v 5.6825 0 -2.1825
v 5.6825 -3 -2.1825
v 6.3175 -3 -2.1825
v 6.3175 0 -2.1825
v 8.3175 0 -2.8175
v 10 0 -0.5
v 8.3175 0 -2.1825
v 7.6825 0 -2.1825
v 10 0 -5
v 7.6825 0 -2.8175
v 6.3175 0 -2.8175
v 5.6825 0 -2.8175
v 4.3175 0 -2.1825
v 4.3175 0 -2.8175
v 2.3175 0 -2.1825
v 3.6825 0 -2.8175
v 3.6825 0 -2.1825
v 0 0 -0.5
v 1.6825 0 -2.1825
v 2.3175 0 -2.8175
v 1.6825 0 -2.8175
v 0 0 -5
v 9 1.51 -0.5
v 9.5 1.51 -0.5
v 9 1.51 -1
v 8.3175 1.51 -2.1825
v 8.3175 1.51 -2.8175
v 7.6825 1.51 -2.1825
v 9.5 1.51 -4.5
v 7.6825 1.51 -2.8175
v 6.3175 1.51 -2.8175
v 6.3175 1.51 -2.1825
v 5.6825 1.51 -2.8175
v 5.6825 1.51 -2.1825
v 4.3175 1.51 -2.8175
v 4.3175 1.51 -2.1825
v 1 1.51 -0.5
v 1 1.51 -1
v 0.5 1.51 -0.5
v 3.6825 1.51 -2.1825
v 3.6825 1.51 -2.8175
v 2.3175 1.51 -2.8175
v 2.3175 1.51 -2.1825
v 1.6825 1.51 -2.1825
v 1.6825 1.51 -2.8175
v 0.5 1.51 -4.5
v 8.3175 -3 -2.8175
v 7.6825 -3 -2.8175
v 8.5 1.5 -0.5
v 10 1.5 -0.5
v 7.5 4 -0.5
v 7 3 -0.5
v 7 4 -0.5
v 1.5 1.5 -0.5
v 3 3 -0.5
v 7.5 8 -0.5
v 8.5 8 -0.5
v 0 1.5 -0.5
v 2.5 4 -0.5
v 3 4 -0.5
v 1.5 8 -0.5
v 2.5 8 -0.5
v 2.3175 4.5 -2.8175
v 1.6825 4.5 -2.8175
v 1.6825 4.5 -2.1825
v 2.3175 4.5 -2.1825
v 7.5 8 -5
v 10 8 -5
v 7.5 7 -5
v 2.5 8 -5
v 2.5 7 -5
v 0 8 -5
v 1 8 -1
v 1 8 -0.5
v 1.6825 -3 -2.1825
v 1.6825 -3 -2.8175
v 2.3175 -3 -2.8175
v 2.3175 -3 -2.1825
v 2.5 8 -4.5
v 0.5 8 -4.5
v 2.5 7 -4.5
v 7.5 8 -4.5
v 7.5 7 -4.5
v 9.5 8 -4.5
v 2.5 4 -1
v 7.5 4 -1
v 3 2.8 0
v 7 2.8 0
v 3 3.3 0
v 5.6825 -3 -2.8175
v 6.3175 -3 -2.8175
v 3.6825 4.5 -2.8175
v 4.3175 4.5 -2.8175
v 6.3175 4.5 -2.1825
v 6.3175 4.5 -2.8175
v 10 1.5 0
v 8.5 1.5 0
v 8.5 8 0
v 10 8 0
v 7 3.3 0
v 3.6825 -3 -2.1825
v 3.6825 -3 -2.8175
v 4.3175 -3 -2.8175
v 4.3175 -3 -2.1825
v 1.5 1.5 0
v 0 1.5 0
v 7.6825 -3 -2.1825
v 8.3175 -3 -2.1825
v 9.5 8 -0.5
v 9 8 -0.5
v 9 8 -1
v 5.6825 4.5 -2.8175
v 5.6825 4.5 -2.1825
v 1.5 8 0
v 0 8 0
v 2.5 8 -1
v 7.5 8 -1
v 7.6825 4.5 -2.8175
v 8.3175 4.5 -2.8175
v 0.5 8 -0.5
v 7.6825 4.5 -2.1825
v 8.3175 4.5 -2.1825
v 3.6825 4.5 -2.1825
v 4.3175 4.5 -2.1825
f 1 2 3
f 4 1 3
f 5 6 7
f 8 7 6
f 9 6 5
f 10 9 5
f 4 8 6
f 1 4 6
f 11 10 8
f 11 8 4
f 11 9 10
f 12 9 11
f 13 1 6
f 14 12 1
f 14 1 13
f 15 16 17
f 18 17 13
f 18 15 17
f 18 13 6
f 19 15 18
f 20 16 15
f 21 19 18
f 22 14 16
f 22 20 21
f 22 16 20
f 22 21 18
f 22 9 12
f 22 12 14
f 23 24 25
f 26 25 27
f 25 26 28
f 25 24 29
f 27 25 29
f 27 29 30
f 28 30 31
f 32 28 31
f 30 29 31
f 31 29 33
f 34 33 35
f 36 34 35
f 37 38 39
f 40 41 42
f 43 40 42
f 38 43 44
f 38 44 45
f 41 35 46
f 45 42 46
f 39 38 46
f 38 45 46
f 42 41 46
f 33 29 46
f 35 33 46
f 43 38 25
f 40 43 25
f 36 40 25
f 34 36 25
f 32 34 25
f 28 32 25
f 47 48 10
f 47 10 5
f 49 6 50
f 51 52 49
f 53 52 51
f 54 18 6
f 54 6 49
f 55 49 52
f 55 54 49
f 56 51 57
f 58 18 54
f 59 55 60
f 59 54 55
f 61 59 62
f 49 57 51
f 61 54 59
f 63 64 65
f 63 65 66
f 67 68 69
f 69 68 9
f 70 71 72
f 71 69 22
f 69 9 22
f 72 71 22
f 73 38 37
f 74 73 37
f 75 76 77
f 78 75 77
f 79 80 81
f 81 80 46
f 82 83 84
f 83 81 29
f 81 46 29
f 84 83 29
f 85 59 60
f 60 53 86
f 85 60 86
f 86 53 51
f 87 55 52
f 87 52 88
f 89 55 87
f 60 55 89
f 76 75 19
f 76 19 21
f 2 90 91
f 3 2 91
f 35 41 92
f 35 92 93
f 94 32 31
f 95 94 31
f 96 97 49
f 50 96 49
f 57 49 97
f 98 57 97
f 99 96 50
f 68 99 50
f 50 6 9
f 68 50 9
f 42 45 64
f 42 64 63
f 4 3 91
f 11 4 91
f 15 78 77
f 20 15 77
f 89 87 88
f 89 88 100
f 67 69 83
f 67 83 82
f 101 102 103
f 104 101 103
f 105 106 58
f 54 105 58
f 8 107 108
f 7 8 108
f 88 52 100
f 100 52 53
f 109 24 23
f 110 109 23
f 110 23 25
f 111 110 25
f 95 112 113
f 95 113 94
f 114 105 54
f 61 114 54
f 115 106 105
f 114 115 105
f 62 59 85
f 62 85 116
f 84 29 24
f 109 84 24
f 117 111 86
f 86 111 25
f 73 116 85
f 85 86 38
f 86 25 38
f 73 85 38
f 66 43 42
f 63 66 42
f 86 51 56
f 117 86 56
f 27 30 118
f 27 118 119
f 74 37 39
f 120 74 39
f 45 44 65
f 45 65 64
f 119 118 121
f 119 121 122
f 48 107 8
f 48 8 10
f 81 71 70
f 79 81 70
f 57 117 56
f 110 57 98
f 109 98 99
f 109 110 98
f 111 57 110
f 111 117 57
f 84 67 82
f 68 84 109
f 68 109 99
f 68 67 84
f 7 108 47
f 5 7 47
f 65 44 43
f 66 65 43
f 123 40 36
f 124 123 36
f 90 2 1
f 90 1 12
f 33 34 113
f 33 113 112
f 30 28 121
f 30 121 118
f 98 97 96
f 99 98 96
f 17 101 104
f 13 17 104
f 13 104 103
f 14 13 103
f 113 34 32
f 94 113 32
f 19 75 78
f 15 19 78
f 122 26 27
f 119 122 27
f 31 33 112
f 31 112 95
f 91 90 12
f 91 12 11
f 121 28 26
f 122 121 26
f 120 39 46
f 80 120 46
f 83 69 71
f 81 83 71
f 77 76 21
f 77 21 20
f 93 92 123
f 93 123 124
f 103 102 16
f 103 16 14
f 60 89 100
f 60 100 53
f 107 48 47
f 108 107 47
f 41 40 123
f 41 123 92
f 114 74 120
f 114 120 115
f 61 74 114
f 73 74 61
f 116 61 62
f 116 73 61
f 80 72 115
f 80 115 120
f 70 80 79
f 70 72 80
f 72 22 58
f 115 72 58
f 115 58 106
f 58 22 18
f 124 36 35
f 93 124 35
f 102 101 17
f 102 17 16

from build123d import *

# Parameters (mm, degrees)
SIDES_DEPTH           = 8
SKETCH2_W             = 5
SKETCH2_H             = 4
FRONT_CUT_DEPTH       = 0.5
BACK_CUT_REACH        = 15.748
SKETCH3_W             = 5
SKETCH3_H             = 1
BASE_DEPTH            = 0.5
PINS_DEPTH            = 4
PINS_DEPTH_BACK       = 3.5
SKETCH4_W             = 0.635
SKETCH4_H             = 0.635
CLIP_DEPTH            = 2
CLIP_DEPTH_BACK       = 2
FRONT_TRIM_DEPTH      = 11.677078252
FRONT_TRIM_DEPTH_BACK = 11.677078252
SKETCH6_W             = 0.5
SKETCH6_H             = 1.5
BOSS_EXTRUDE4_DEPTH   = 1.51


with BuildPart() as part:
    # Sketch1 → Sides (new body)
    with BuildSketch(Plane(origin=(0, 0, 0), x_dir=(1, 0, 0), z_dir=(0, 1, 0))):
        Polygon((8.5, 0), (10, 0), (10, 5), (0, 5), (0, 0), (1.5, 0), (1.5, 0.5), (8.5, 0.5), align=None)
        Polygon((0.5, 4.5), (9.5, 4.5), (9.5, 1.528846154), (9.5, 0.5), (9, 0.5), (9, 1), (1, 1), (1, 0.5), (0.5, 0.5), (0.5, 1.538461538), align=None, mode=Mode.SUBTRACT)
    extrude(amount=SIDES_DEPTH)

    # Sketch2 → Front cut (cut)
    with BuildSketch(Plane.XY.offset(-0.5)):
        with Locations((5, 6)):
            Rectangle(SKETCH2_W, SKETCH2_H)
    extrude(amount=-FRONT_CUT_DEPTH, mode=Mode.SUBTRACT)

    # Sketch3 → Back cut (cut, up to next)
    with BuildSketch(Plane(origin=(0, 0, -5), x_dir=(-1, 0, 0), z_dir=(0, 0, -1)), mode=Mode.PRIVATE) as back_cut_sk1:
        with Locations((-5, 7.5)):
            Rectangle(SKETCH3_W, SKETCH3_H)
    back_cut_tool1 = extrude(back_cut_sk1.sketch, amount=-BACK_CUT_REACH, mode=Mode.PRIVATE) & part.part
    add(back_cut_tool1.solids().sort_by_distance((5, 7.5, -5))[0], mode=Mode.SUBTRACT)

    # Sketch1<2> → Base (add)
    with BuildSketch(Plane(origin=(0, 0, 0), x_dir=(1, 0, 0), z_dir=(0, 1, 0))):
        Polygon((1, 1), (1, 0.5), (0.5, 0.5), (0.5, 1.538461538), (0.5, 4.5), (9.5, 4.5), (9.5, 1.528846154), (9.5, 0.5), (9, 0.5), (9, 1), align=None)
    extrude(amount=BASE_DEPTH)

    # Sketch4 → Pins (add, two sides: drawn at the far end of the back side and taken through both)
    with BuildSketch(Plane(origin=(0, 0.5, 0), x_dir=(1, 0, 0), z_dir=(0, 1, 0)).offset(-PINS_DEPTH_BACK)):
        with Locations((2, 2.5)):
            Rectangle(SKETCH4_W, SKETCH4_H)
        with Locations((4, 2.5)):
            Rectangle(SKETCH4_W, SKETCH4_H)
        with Locations((6, 2.5)):
            Rectangle(SKETCH4_W, SKETCH4_H)
        with Locations((8, 2.5)):
            Rectangle(SKETCH4_W, SKETCH4_H)
    extrude(amount=PINS_DEPTH + PINS_DEPTH_BACK)

    # Sketch5 → Clip (add, two sides: drawn at the far end of the back side and taken through both)
    with BuildSketch(Plane(origin=(5, 0, 0), x_dir=(0, 0, -1), z_dir=(1, 0, 0)).offset(-CLIP_DEPTH_BACK)):
        Polygon((0.5, 4), (0.5, 3), (0, 2.8), (0, 3.3), align=None)
    extrude(amount=CLIP_DEPTH + CLIP_DEPTH_BACK)

    # Sketch6 → Front trim (cut, two sides: drawn at the far end of the back side and taken through both)
    with BuildSketch(Plane(origin=(5, 0, 0), x_dir=(0, 0, -1), z_dir=(1, 0, 0)).offset(-FRONT_TRIM_DEPTH_BACK)):
        with Locations((0.25, 0.75)):
            Rectangle(SKETCH6_W, SKETCH6_H)
    extrude(amount=FRONT_TRIM_DEPTH + FRONT_TRIM_DEPTH_BACK, mode=Mode.SUBTRACT)

    # Sketch1<4> → Boss-Extrude4 (add)
    with BuildSketch(Plane(origin=(0, 0, 0), x_dir=(1, 0, 0), z_dir=(0, 1, 0))):
        Polygon((1, 1), (1, 0.5), (0.5, 0.5), (0.5, 1.538461538), (0.5, 4.5), (9.5, 4.5), (9.5, 1.528846154), (9.5, 0.5), (9, 0.5), (9, 1), align=None)
    extrude(amount=BOSS_EXTRUDE4_DEPTH)


solid = part.part
